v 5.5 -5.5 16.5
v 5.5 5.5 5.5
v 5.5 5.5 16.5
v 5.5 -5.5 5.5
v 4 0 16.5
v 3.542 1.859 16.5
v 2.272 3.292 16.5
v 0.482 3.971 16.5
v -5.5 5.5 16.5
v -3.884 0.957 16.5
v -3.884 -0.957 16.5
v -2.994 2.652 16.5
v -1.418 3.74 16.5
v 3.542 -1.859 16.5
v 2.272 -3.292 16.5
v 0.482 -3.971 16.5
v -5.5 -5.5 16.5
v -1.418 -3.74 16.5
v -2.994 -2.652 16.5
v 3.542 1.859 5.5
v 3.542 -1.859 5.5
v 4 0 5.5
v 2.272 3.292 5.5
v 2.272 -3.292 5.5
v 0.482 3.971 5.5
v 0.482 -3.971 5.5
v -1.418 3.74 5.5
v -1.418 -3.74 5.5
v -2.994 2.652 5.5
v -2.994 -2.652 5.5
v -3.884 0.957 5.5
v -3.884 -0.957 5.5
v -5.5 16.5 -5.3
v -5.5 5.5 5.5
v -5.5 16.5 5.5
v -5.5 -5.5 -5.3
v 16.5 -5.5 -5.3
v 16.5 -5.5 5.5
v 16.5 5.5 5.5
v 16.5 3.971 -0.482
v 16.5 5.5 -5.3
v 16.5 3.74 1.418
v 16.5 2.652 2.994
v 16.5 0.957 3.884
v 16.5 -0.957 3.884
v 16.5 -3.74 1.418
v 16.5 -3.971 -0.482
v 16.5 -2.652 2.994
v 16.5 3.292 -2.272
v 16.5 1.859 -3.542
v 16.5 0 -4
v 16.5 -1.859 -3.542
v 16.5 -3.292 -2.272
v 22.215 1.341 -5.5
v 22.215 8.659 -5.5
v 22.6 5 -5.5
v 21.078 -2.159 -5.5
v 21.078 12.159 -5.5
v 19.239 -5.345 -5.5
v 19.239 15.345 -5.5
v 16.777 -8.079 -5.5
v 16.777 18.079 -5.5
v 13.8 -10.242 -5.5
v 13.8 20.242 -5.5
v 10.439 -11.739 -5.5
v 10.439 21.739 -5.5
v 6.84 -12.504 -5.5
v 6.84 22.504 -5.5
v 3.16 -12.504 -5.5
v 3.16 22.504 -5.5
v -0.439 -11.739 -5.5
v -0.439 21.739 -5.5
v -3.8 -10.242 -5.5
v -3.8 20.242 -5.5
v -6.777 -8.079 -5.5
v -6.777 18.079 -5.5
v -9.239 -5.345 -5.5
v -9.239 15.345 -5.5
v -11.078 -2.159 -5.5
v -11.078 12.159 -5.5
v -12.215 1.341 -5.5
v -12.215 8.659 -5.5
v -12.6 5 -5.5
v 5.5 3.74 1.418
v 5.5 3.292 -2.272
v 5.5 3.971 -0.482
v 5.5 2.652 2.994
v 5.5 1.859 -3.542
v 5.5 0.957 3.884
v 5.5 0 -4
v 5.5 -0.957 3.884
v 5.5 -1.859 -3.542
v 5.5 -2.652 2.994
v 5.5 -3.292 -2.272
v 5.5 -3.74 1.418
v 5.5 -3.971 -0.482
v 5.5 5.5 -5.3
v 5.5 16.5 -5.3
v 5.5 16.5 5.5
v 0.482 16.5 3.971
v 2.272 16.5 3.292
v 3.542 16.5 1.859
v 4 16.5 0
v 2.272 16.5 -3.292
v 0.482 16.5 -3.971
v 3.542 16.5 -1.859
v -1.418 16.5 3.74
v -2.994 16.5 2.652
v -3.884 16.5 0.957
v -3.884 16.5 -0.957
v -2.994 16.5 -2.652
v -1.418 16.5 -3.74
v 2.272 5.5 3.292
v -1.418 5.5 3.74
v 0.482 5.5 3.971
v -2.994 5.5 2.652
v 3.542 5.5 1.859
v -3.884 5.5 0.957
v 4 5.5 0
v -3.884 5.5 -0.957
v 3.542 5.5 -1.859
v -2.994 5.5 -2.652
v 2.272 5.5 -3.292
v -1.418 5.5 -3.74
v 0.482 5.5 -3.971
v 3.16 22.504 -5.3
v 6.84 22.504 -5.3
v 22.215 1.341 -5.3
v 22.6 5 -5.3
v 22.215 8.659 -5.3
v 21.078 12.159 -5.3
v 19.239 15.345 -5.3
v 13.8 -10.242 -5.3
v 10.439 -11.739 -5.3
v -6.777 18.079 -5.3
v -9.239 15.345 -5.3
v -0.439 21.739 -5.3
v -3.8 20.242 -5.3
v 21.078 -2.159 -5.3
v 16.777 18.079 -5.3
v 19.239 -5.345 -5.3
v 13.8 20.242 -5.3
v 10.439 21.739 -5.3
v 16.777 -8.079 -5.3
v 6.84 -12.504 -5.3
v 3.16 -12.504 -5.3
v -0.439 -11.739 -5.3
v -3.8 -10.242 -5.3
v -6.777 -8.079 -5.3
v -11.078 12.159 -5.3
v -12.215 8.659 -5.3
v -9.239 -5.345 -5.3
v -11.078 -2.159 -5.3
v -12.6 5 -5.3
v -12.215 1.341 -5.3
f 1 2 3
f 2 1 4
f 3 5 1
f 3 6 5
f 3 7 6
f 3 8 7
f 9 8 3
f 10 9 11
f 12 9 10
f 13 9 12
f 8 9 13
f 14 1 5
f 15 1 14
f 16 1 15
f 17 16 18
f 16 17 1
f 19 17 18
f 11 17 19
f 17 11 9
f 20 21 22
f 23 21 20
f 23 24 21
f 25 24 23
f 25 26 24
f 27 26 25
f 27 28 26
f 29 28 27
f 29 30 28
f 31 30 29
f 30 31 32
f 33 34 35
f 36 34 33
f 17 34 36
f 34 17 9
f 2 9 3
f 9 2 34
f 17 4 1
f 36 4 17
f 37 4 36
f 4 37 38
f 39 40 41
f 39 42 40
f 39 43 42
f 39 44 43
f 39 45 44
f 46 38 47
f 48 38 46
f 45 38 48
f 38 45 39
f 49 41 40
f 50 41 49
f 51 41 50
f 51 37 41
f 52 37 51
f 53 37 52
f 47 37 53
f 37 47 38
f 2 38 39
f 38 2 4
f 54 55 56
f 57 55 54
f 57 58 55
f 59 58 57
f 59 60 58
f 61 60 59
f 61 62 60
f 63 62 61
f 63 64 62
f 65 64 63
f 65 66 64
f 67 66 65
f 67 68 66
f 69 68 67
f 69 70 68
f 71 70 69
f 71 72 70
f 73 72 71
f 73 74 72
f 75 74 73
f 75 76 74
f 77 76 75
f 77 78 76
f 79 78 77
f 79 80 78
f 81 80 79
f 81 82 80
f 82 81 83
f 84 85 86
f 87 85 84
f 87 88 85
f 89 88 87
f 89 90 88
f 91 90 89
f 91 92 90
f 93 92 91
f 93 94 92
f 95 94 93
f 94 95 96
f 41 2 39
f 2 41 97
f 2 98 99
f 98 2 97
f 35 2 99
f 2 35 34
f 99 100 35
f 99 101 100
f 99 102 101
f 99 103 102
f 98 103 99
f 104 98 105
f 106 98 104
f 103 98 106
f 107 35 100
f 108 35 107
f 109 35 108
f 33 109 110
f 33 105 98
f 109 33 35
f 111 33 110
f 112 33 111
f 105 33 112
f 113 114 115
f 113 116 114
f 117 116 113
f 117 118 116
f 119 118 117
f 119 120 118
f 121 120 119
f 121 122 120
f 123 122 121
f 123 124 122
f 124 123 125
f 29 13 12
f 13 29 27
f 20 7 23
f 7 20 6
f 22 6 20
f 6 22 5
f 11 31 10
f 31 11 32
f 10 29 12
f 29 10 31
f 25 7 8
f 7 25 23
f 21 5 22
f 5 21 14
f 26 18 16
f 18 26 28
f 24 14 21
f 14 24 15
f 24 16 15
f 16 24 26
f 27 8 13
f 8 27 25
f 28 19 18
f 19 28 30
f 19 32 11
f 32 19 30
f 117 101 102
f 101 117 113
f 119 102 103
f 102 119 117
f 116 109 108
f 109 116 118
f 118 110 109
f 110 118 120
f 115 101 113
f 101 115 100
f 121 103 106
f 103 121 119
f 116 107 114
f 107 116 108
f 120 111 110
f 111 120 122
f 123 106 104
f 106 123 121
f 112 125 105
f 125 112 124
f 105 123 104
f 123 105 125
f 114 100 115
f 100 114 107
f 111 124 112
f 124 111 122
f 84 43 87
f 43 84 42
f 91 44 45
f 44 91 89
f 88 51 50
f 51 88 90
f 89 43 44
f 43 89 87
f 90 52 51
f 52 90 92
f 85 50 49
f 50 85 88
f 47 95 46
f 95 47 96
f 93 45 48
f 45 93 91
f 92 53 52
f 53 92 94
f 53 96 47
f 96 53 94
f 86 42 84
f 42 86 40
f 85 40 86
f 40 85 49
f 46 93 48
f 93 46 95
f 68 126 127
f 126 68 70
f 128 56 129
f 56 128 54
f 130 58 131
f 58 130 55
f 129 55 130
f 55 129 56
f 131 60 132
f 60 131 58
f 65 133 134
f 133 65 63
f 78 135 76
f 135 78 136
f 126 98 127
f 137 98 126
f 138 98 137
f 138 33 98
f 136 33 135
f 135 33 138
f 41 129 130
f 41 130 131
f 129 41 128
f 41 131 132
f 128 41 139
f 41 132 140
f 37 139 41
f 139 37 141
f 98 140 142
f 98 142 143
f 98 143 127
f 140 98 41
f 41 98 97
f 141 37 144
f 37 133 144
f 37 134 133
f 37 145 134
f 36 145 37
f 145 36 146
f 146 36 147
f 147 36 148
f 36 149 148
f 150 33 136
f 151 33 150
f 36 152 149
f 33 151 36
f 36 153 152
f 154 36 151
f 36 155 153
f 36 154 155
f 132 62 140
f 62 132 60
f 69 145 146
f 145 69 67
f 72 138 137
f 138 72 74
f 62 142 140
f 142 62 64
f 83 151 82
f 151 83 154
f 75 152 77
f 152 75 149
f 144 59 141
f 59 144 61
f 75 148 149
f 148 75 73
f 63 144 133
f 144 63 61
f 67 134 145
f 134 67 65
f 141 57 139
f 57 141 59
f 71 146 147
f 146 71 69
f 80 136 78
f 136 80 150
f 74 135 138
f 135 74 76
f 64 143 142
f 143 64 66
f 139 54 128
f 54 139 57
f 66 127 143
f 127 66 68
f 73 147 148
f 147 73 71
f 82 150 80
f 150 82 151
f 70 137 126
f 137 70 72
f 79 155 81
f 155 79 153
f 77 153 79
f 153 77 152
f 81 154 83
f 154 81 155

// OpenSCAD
// BioCube Corner by Urban Reininger twitter: UrbanAtWork Thingiverse: UrbanAtWork
// Working with the Ross School Innovation lab www.ross.org

	//include <utils/build_plate.scad>

//CUSTOMIZER VARIABLES

// Hole Radius (mm)
cyl_rsize = 4;// [1:20]

// Wall padding "thickness" (mm halved)
wallThickness = 3; //[1:20]

//CUSTOMIZER VARIABLES END

cubesize = cyl_rsize*2+wallThickness;

cyl_hsize = 200;

helperDisc = cubesize*1.6;
helperDiscZloc = -(cyl_rsize + 1.4);

module bioCubeCorner()
{
	module rotcy(rot, cyl_rsize, cyl_hsize) {
		rotate(90, rot)
			cylinder(r = cyl_rsize, h = cyl_hsize, center = true);
	}

union(){

	difference() {
		union(){
	translate([ 0, 0, cubesize ])
		cube([cubesize, cubesize, cubesize], center = true);
	translate([ cubesize, 0, 0 ])
		cube([cubesize, cubesize, cubesize], center = true);
	translate([ 0, cubesize, 0 ])
		cube([cubesize, cubesize, cubesize], center = true);
		}
		rotcy([0, 0, 0], cyl_rsize, cyl_hsize);
		rotcy([1, 0, 0], cyl_rsize, cyl_hsize);
		rotcy([0, 1, 0], cyl_rsize, cyl_hsize);
	}
// This is the corner base cube
		cube([cubesize, cubesize, cubesize], center = true);

// This is a .2mm disk to help it stick to the build plate
translate([ 5, 5, helperDiscZloc ])
	cylinder(r = helperDisc, h = 0.2, center = true);
}

}
bioCubeCorner();
